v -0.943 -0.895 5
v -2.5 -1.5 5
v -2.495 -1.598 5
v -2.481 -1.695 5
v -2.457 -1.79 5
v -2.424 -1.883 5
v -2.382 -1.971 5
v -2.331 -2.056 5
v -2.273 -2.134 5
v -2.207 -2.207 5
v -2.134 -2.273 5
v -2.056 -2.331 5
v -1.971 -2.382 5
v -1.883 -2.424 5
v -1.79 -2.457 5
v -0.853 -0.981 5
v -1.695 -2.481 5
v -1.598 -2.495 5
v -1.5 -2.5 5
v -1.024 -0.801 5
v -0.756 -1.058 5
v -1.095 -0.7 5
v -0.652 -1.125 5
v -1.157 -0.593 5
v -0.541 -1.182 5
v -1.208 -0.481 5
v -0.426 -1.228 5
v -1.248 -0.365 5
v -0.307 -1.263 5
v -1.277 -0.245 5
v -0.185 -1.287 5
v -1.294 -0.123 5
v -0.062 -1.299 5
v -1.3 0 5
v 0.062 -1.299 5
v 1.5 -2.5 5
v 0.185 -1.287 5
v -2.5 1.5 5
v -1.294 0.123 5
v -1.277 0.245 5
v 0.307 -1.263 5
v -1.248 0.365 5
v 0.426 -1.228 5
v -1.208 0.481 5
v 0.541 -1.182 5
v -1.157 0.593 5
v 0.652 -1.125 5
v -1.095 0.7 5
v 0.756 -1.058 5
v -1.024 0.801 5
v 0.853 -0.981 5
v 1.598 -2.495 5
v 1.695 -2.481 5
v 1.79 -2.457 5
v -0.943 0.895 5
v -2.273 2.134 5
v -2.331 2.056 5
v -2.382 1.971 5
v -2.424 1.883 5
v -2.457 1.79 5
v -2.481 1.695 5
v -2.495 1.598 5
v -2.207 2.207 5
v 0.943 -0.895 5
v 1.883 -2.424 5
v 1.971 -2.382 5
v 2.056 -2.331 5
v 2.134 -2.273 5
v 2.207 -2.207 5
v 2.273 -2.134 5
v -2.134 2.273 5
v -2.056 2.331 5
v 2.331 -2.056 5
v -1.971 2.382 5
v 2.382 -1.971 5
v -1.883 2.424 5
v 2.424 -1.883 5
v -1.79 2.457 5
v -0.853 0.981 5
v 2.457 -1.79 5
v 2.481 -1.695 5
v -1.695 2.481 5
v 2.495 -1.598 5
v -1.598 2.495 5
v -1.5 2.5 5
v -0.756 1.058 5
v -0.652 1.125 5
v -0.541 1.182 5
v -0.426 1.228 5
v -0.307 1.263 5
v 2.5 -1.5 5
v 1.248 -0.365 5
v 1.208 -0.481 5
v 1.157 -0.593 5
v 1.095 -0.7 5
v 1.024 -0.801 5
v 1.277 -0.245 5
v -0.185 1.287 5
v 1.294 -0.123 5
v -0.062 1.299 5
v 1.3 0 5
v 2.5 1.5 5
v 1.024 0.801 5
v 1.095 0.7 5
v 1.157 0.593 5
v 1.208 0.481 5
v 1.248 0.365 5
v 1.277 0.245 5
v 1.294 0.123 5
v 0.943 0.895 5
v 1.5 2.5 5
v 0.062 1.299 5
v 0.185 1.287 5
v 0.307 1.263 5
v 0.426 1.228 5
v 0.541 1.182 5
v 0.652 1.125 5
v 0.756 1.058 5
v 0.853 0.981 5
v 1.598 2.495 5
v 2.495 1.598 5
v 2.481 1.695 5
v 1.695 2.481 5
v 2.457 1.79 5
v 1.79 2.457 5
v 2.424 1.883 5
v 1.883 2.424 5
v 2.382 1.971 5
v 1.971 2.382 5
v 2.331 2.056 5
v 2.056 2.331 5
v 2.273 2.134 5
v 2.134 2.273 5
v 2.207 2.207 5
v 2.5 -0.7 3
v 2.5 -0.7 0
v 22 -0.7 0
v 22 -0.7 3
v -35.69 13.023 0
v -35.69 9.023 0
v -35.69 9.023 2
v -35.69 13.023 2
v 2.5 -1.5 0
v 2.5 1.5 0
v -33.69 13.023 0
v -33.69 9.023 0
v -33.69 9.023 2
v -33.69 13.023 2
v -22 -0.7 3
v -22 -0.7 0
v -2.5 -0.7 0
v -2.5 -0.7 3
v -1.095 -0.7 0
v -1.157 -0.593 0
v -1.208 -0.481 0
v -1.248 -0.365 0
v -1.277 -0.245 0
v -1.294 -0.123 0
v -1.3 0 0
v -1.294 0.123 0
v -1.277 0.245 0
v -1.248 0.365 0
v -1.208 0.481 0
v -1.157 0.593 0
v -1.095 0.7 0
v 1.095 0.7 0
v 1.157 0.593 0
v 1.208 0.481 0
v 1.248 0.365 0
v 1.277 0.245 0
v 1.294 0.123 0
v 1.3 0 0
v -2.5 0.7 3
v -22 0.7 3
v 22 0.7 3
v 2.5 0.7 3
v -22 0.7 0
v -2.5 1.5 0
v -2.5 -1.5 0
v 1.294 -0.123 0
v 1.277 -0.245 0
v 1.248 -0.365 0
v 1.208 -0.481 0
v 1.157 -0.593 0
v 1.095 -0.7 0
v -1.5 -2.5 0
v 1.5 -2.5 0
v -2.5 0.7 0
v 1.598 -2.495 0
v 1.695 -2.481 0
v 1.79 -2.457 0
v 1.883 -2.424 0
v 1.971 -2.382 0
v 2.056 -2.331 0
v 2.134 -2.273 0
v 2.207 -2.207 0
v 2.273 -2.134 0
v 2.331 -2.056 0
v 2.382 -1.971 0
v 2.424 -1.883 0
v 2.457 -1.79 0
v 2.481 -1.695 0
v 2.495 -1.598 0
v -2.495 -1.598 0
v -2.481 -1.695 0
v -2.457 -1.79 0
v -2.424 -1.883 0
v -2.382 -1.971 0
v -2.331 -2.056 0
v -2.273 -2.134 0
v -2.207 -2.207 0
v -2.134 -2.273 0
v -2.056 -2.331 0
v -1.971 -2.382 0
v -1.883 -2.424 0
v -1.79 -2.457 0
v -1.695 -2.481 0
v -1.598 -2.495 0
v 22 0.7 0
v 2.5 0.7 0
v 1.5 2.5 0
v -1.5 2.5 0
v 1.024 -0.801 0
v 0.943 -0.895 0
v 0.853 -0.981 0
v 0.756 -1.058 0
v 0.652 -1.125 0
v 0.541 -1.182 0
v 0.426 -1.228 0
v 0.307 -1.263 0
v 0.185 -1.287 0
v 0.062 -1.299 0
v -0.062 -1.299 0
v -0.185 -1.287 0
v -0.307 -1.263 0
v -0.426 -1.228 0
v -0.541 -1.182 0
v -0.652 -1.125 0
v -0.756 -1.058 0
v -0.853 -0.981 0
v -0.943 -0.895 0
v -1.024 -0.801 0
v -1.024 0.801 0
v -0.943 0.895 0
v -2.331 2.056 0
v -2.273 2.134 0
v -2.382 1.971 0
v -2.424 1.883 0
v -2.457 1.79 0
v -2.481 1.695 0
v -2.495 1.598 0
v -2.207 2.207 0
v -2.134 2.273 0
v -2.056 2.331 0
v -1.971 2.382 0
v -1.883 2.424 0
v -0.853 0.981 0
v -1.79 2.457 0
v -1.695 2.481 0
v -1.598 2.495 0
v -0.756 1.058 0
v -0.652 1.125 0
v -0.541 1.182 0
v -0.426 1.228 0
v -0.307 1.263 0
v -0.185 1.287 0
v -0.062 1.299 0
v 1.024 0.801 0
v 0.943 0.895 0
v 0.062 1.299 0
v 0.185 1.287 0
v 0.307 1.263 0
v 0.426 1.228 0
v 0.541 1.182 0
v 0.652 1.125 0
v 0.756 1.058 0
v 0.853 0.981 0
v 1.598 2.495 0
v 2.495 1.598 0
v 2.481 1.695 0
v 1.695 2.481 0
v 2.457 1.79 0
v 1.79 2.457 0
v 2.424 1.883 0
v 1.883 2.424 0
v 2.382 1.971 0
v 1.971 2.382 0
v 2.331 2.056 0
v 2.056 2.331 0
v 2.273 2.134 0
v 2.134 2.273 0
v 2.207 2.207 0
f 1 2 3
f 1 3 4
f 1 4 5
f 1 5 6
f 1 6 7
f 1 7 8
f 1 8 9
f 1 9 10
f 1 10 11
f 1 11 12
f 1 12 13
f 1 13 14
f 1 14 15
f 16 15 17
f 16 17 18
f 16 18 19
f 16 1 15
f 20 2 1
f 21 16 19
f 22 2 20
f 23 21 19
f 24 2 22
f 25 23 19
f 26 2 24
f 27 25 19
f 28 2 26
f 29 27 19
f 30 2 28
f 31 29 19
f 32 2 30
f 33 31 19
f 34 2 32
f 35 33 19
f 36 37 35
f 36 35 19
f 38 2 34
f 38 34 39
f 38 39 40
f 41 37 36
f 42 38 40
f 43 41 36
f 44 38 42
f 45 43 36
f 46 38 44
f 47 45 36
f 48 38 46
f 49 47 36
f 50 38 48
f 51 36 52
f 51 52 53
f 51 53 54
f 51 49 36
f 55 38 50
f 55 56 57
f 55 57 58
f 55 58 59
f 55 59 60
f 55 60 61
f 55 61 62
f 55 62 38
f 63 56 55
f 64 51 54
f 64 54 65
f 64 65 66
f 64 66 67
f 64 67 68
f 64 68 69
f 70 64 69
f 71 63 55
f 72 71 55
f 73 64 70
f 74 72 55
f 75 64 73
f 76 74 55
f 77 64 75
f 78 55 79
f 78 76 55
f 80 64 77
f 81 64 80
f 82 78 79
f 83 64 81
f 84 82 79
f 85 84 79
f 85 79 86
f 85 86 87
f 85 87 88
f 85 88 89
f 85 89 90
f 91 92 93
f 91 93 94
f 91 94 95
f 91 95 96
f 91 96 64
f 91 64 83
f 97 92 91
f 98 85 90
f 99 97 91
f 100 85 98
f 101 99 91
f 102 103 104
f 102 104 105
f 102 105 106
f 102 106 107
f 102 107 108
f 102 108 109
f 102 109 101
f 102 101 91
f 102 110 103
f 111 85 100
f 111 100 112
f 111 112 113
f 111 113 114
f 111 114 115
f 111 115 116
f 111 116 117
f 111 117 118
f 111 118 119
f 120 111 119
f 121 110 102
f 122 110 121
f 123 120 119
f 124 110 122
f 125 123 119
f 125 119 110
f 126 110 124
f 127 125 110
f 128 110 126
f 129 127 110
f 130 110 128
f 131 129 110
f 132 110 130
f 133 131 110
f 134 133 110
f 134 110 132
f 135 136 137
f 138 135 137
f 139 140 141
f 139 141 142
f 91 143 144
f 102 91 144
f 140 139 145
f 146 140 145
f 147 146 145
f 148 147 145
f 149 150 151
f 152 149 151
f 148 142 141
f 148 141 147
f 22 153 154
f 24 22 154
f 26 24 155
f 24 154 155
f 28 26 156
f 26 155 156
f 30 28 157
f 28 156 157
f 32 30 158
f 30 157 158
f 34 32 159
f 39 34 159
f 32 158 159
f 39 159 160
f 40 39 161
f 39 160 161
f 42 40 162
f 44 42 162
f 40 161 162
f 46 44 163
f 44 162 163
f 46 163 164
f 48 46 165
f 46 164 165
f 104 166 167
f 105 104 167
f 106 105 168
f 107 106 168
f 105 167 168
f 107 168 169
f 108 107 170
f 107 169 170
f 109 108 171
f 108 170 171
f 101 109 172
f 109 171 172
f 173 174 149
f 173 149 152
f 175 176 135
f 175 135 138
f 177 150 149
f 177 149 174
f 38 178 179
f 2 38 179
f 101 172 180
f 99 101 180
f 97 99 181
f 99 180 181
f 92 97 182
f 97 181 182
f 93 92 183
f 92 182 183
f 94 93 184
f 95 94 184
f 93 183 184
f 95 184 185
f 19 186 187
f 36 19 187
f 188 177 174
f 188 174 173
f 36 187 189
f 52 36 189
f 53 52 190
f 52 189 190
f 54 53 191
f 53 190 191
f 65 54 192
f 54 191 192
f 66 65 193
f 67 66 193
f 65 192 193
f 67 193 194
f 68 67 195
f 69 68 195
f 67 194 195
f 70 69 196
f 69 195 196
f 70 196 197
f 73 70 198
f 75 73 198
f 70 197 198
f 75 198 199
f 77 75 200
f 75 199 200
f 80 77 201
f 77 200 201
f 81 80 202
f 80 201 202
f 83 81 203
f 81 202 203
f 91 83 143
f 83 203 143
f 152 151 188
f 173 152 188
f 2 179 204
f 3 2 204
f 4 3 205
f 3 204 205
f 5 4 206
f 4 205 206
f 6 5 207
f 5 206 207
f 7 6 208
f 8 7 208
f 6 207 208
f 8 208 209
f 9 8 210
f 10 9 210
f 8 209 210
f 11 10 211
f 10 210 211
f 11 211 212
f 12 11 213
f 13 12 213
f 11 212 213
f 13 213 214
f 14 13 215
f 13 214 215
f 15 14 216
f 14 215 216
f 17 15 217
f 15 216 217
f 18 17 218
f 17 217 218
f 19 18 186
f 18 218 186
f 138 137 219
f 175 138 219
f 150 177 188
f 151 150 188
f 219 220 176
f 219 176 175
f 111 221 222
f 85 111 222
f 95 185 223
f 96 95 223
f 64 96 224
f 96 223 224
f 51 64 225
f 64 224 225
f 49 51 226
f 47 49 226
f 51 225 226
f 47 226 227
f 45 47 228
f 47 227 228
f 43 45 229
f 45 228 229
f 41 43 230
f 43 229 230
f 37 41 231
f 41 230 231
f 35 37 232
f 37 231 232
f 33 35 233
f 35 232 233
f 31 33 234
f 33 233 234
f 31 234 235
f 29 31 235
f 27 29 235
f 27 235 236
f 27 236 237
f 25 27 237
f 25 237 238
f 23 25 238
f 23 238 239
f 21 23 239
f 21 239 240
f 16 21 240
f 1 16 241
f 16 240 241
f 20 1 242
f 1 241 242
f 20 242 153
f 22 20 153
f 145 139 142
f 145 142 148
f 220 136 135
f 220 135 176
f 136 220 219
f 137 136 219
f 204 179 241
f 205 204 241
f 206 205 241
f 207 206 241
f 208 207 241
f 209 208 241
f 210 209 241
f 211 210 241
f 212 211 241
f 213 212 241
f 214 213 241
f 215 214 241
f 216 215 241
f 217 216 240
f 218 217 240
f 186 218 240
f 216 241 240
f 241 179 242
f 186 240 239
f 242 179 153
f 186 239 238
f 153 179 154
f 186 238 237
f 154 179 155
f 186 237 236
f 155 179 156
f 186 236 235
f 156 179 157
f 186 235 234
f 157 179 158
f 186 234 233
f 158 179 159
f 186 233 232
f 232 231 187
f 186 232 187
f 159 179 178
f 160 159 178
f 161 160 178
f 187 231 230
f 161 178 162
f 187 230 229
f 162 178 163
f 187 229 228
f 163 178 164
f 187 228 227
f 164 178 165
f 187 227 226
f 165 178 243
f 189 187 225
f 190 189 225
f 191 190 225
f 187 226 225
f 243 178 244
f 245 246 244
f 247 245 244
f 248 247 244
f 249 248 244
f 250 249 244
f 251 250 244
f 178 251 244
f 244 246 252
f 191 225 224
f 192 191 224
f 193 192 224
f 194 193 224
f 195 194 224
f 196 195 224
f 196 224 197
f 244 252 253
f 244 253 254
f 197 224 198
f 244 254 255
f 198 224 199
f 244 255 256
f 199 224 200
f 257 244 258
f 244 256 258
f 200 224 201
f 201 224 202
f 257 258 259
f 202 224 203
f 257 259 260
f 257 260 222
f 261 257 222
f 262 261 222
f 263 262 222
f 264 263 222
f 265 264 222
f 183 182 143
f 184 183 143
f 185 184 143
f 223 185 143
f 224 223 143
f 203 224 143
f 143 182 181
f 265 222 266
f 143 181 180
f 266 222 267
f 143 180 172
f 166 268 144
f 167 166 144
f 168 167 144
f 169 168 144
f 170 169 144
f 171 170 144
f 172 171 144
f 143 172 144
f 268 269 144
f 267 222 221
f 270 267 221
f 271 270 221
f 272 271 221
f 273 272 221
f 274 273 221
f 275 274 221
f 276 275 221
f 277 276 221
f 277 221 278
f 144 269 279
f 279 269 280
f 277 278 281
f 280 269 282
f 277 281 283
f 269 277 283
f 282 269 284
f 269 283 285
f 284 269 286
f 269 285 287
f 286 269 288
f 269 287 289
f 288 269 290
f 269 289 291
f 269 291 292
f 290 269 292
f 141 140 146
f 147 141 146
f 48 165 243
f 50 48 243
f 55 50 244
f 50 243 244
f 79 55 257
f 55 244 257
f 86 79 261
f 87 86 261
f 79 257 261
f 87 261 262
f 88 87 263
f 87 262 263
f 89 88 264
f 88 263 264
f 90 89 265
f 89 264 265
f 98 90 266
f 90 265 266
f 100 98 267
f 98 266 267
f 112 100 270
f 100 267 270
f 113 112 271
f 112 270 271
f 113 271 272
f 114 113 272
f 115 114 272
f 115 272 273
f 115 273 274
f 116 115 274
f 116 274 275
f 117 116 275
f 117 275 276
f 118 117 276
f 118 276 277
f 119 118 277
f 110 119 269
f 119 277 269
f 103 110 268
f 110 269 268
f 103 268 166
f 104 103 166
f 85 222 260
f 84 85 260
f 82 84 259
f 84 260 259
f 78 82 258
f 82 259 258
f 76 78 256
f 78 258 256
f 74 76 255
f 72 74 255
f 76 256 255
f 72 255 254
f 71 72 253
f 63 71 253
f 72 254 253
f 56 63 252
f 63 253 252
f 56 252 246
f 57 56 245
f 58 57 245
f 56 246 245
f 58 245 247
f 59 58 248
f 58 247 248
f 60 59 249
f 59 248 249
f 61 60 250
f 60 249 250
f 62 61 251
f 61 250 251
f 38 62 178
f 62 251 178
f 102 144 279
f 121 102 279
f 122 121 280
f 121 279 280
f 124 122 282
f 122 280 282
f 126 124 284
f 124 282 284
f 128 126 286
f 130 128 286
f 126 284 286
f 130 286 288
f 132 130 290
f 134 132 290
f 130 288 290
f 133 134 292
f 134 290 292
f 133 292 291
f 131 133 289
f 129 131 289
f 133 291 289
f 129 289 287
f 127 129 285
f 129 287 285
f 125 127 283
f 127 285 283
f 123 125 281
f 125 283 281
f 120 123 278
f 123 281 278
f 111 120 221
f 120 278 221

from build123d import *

# Parameters (mm, degrees)
F0_W     = 19.5
F0_H     = 1.4
F1_DEPTH = 3
F2_DEPTH = 5
F0_W_2   = 2
F0_H_2   = 4
F3_DEPTH = 2


with BuildPart() as f1:
    # F0 (on Top) → F1 (new body)
    with BuildSketch(Plane.XY):
        with Locations((-12.25, 0)):
            Rectangle(F0_W, F0_H)
    extrude(amount=F1_DEPTH)


with BuildPart() as f1b:
    # F0 (on Top) → F1, piece 2 (new body)
    with BuildSketch(Plane.XY):
        with Locations((12.25, 0)):
            Rectangle(F0_W, F0_H)
    extrude(amount=F1_DEPTH)


with BuildPart() as f2:
    # F0 (on Top) → F2 (new body)
    with BuildSketch(Plane.XY):
        with BuildLine():
            Line((-2.5, 1.5), (-2.5, 0.7))
            Line((-2.5, 0.7), (-1.095445115, 0.7))
            ThreePointArc((-1.095445115, 0.7), (0, 1.3), (1.095445115, 0.7))
            Line((1.095445115, 0.7), (2.5, 0.7))
            Line((2.5, 0.7), (2.5, 1.5))
            ThreePointArc((2.5, 1.5), (2.2071067812, 2.2071067812), (1.5, 2.5))
            Line((1.5, 2.5), (-1.5, 2.5))
            ThreePointArc((-1.5, 2.5), (-2.2071067812, 2.2071067812), (-2.5, 1.5))
        make_face()
        with BuildLine():
            Line((-1.095445115, 0.7), (-2.5, 0.7))
            Line((-2.5, 0.7), (-2.5, -0.7))
            Line((-2.5, -0.7), (-1.095445115, -0.7))
            ThreePointArc((-1.095445115, -0.7), (-1.3, 0), (-1.095445115, 0.7))
        make_face()
        with BuildLine():
            Line((2.5, 0.7), (1.095445115, 0.7))
            ThreePointArc((1.095445115, 0.7), (1.2478138181, 0.3646377315), (1.3, 0))
            ThreePointArc((1.3, 0), (1.2478138181, -0.3646377315), (1.095445115, -0.7))
            Line((1.095445115, -0.7), (2.5, -0.7))
            Line((2.5, -0.7), (2.5, 0.7))
        make_face()
        with BuildLine():
            Line((-1.095445115, -0.7), (-2.5, -0.7))
            Line((-2.5, -0.7), (-2.5, -1.5))
            ThreePointArc((-2.5, -1.5), (-2.2071067812, -2.2071067812), (-1.5, -2.5))
            Line((-1.5, -2.5), (1.5, -2.5))
            ThreePointArc((1.5, -2.5), (2.2071067812, -2.2071067812), (2.5, -1.5))
            Line((2.5, -1.5), (2.5, -0.7))
            Line((2.5, -0.7), (1.095445115, -0.7))
            ThreePointArc((1.095445115, -0.7), (0, -1.3), (-1.095445115, -0.7))
        make_face()
    extrude(amount=F2_DEPTH)


with BuildPart() as f3:
    # F0 (on Top) → F3 (new body)
    with BuildSketch(Plane.XY):
        with Locations((-34.6903076172, 11.0231541544)):
            Rectangle(F0_W_2, F0_H_2)
    extrude(amount=F3_DEPTH)


solid = Compound([f1.part, f1b.part, f2.part, f3.part])
